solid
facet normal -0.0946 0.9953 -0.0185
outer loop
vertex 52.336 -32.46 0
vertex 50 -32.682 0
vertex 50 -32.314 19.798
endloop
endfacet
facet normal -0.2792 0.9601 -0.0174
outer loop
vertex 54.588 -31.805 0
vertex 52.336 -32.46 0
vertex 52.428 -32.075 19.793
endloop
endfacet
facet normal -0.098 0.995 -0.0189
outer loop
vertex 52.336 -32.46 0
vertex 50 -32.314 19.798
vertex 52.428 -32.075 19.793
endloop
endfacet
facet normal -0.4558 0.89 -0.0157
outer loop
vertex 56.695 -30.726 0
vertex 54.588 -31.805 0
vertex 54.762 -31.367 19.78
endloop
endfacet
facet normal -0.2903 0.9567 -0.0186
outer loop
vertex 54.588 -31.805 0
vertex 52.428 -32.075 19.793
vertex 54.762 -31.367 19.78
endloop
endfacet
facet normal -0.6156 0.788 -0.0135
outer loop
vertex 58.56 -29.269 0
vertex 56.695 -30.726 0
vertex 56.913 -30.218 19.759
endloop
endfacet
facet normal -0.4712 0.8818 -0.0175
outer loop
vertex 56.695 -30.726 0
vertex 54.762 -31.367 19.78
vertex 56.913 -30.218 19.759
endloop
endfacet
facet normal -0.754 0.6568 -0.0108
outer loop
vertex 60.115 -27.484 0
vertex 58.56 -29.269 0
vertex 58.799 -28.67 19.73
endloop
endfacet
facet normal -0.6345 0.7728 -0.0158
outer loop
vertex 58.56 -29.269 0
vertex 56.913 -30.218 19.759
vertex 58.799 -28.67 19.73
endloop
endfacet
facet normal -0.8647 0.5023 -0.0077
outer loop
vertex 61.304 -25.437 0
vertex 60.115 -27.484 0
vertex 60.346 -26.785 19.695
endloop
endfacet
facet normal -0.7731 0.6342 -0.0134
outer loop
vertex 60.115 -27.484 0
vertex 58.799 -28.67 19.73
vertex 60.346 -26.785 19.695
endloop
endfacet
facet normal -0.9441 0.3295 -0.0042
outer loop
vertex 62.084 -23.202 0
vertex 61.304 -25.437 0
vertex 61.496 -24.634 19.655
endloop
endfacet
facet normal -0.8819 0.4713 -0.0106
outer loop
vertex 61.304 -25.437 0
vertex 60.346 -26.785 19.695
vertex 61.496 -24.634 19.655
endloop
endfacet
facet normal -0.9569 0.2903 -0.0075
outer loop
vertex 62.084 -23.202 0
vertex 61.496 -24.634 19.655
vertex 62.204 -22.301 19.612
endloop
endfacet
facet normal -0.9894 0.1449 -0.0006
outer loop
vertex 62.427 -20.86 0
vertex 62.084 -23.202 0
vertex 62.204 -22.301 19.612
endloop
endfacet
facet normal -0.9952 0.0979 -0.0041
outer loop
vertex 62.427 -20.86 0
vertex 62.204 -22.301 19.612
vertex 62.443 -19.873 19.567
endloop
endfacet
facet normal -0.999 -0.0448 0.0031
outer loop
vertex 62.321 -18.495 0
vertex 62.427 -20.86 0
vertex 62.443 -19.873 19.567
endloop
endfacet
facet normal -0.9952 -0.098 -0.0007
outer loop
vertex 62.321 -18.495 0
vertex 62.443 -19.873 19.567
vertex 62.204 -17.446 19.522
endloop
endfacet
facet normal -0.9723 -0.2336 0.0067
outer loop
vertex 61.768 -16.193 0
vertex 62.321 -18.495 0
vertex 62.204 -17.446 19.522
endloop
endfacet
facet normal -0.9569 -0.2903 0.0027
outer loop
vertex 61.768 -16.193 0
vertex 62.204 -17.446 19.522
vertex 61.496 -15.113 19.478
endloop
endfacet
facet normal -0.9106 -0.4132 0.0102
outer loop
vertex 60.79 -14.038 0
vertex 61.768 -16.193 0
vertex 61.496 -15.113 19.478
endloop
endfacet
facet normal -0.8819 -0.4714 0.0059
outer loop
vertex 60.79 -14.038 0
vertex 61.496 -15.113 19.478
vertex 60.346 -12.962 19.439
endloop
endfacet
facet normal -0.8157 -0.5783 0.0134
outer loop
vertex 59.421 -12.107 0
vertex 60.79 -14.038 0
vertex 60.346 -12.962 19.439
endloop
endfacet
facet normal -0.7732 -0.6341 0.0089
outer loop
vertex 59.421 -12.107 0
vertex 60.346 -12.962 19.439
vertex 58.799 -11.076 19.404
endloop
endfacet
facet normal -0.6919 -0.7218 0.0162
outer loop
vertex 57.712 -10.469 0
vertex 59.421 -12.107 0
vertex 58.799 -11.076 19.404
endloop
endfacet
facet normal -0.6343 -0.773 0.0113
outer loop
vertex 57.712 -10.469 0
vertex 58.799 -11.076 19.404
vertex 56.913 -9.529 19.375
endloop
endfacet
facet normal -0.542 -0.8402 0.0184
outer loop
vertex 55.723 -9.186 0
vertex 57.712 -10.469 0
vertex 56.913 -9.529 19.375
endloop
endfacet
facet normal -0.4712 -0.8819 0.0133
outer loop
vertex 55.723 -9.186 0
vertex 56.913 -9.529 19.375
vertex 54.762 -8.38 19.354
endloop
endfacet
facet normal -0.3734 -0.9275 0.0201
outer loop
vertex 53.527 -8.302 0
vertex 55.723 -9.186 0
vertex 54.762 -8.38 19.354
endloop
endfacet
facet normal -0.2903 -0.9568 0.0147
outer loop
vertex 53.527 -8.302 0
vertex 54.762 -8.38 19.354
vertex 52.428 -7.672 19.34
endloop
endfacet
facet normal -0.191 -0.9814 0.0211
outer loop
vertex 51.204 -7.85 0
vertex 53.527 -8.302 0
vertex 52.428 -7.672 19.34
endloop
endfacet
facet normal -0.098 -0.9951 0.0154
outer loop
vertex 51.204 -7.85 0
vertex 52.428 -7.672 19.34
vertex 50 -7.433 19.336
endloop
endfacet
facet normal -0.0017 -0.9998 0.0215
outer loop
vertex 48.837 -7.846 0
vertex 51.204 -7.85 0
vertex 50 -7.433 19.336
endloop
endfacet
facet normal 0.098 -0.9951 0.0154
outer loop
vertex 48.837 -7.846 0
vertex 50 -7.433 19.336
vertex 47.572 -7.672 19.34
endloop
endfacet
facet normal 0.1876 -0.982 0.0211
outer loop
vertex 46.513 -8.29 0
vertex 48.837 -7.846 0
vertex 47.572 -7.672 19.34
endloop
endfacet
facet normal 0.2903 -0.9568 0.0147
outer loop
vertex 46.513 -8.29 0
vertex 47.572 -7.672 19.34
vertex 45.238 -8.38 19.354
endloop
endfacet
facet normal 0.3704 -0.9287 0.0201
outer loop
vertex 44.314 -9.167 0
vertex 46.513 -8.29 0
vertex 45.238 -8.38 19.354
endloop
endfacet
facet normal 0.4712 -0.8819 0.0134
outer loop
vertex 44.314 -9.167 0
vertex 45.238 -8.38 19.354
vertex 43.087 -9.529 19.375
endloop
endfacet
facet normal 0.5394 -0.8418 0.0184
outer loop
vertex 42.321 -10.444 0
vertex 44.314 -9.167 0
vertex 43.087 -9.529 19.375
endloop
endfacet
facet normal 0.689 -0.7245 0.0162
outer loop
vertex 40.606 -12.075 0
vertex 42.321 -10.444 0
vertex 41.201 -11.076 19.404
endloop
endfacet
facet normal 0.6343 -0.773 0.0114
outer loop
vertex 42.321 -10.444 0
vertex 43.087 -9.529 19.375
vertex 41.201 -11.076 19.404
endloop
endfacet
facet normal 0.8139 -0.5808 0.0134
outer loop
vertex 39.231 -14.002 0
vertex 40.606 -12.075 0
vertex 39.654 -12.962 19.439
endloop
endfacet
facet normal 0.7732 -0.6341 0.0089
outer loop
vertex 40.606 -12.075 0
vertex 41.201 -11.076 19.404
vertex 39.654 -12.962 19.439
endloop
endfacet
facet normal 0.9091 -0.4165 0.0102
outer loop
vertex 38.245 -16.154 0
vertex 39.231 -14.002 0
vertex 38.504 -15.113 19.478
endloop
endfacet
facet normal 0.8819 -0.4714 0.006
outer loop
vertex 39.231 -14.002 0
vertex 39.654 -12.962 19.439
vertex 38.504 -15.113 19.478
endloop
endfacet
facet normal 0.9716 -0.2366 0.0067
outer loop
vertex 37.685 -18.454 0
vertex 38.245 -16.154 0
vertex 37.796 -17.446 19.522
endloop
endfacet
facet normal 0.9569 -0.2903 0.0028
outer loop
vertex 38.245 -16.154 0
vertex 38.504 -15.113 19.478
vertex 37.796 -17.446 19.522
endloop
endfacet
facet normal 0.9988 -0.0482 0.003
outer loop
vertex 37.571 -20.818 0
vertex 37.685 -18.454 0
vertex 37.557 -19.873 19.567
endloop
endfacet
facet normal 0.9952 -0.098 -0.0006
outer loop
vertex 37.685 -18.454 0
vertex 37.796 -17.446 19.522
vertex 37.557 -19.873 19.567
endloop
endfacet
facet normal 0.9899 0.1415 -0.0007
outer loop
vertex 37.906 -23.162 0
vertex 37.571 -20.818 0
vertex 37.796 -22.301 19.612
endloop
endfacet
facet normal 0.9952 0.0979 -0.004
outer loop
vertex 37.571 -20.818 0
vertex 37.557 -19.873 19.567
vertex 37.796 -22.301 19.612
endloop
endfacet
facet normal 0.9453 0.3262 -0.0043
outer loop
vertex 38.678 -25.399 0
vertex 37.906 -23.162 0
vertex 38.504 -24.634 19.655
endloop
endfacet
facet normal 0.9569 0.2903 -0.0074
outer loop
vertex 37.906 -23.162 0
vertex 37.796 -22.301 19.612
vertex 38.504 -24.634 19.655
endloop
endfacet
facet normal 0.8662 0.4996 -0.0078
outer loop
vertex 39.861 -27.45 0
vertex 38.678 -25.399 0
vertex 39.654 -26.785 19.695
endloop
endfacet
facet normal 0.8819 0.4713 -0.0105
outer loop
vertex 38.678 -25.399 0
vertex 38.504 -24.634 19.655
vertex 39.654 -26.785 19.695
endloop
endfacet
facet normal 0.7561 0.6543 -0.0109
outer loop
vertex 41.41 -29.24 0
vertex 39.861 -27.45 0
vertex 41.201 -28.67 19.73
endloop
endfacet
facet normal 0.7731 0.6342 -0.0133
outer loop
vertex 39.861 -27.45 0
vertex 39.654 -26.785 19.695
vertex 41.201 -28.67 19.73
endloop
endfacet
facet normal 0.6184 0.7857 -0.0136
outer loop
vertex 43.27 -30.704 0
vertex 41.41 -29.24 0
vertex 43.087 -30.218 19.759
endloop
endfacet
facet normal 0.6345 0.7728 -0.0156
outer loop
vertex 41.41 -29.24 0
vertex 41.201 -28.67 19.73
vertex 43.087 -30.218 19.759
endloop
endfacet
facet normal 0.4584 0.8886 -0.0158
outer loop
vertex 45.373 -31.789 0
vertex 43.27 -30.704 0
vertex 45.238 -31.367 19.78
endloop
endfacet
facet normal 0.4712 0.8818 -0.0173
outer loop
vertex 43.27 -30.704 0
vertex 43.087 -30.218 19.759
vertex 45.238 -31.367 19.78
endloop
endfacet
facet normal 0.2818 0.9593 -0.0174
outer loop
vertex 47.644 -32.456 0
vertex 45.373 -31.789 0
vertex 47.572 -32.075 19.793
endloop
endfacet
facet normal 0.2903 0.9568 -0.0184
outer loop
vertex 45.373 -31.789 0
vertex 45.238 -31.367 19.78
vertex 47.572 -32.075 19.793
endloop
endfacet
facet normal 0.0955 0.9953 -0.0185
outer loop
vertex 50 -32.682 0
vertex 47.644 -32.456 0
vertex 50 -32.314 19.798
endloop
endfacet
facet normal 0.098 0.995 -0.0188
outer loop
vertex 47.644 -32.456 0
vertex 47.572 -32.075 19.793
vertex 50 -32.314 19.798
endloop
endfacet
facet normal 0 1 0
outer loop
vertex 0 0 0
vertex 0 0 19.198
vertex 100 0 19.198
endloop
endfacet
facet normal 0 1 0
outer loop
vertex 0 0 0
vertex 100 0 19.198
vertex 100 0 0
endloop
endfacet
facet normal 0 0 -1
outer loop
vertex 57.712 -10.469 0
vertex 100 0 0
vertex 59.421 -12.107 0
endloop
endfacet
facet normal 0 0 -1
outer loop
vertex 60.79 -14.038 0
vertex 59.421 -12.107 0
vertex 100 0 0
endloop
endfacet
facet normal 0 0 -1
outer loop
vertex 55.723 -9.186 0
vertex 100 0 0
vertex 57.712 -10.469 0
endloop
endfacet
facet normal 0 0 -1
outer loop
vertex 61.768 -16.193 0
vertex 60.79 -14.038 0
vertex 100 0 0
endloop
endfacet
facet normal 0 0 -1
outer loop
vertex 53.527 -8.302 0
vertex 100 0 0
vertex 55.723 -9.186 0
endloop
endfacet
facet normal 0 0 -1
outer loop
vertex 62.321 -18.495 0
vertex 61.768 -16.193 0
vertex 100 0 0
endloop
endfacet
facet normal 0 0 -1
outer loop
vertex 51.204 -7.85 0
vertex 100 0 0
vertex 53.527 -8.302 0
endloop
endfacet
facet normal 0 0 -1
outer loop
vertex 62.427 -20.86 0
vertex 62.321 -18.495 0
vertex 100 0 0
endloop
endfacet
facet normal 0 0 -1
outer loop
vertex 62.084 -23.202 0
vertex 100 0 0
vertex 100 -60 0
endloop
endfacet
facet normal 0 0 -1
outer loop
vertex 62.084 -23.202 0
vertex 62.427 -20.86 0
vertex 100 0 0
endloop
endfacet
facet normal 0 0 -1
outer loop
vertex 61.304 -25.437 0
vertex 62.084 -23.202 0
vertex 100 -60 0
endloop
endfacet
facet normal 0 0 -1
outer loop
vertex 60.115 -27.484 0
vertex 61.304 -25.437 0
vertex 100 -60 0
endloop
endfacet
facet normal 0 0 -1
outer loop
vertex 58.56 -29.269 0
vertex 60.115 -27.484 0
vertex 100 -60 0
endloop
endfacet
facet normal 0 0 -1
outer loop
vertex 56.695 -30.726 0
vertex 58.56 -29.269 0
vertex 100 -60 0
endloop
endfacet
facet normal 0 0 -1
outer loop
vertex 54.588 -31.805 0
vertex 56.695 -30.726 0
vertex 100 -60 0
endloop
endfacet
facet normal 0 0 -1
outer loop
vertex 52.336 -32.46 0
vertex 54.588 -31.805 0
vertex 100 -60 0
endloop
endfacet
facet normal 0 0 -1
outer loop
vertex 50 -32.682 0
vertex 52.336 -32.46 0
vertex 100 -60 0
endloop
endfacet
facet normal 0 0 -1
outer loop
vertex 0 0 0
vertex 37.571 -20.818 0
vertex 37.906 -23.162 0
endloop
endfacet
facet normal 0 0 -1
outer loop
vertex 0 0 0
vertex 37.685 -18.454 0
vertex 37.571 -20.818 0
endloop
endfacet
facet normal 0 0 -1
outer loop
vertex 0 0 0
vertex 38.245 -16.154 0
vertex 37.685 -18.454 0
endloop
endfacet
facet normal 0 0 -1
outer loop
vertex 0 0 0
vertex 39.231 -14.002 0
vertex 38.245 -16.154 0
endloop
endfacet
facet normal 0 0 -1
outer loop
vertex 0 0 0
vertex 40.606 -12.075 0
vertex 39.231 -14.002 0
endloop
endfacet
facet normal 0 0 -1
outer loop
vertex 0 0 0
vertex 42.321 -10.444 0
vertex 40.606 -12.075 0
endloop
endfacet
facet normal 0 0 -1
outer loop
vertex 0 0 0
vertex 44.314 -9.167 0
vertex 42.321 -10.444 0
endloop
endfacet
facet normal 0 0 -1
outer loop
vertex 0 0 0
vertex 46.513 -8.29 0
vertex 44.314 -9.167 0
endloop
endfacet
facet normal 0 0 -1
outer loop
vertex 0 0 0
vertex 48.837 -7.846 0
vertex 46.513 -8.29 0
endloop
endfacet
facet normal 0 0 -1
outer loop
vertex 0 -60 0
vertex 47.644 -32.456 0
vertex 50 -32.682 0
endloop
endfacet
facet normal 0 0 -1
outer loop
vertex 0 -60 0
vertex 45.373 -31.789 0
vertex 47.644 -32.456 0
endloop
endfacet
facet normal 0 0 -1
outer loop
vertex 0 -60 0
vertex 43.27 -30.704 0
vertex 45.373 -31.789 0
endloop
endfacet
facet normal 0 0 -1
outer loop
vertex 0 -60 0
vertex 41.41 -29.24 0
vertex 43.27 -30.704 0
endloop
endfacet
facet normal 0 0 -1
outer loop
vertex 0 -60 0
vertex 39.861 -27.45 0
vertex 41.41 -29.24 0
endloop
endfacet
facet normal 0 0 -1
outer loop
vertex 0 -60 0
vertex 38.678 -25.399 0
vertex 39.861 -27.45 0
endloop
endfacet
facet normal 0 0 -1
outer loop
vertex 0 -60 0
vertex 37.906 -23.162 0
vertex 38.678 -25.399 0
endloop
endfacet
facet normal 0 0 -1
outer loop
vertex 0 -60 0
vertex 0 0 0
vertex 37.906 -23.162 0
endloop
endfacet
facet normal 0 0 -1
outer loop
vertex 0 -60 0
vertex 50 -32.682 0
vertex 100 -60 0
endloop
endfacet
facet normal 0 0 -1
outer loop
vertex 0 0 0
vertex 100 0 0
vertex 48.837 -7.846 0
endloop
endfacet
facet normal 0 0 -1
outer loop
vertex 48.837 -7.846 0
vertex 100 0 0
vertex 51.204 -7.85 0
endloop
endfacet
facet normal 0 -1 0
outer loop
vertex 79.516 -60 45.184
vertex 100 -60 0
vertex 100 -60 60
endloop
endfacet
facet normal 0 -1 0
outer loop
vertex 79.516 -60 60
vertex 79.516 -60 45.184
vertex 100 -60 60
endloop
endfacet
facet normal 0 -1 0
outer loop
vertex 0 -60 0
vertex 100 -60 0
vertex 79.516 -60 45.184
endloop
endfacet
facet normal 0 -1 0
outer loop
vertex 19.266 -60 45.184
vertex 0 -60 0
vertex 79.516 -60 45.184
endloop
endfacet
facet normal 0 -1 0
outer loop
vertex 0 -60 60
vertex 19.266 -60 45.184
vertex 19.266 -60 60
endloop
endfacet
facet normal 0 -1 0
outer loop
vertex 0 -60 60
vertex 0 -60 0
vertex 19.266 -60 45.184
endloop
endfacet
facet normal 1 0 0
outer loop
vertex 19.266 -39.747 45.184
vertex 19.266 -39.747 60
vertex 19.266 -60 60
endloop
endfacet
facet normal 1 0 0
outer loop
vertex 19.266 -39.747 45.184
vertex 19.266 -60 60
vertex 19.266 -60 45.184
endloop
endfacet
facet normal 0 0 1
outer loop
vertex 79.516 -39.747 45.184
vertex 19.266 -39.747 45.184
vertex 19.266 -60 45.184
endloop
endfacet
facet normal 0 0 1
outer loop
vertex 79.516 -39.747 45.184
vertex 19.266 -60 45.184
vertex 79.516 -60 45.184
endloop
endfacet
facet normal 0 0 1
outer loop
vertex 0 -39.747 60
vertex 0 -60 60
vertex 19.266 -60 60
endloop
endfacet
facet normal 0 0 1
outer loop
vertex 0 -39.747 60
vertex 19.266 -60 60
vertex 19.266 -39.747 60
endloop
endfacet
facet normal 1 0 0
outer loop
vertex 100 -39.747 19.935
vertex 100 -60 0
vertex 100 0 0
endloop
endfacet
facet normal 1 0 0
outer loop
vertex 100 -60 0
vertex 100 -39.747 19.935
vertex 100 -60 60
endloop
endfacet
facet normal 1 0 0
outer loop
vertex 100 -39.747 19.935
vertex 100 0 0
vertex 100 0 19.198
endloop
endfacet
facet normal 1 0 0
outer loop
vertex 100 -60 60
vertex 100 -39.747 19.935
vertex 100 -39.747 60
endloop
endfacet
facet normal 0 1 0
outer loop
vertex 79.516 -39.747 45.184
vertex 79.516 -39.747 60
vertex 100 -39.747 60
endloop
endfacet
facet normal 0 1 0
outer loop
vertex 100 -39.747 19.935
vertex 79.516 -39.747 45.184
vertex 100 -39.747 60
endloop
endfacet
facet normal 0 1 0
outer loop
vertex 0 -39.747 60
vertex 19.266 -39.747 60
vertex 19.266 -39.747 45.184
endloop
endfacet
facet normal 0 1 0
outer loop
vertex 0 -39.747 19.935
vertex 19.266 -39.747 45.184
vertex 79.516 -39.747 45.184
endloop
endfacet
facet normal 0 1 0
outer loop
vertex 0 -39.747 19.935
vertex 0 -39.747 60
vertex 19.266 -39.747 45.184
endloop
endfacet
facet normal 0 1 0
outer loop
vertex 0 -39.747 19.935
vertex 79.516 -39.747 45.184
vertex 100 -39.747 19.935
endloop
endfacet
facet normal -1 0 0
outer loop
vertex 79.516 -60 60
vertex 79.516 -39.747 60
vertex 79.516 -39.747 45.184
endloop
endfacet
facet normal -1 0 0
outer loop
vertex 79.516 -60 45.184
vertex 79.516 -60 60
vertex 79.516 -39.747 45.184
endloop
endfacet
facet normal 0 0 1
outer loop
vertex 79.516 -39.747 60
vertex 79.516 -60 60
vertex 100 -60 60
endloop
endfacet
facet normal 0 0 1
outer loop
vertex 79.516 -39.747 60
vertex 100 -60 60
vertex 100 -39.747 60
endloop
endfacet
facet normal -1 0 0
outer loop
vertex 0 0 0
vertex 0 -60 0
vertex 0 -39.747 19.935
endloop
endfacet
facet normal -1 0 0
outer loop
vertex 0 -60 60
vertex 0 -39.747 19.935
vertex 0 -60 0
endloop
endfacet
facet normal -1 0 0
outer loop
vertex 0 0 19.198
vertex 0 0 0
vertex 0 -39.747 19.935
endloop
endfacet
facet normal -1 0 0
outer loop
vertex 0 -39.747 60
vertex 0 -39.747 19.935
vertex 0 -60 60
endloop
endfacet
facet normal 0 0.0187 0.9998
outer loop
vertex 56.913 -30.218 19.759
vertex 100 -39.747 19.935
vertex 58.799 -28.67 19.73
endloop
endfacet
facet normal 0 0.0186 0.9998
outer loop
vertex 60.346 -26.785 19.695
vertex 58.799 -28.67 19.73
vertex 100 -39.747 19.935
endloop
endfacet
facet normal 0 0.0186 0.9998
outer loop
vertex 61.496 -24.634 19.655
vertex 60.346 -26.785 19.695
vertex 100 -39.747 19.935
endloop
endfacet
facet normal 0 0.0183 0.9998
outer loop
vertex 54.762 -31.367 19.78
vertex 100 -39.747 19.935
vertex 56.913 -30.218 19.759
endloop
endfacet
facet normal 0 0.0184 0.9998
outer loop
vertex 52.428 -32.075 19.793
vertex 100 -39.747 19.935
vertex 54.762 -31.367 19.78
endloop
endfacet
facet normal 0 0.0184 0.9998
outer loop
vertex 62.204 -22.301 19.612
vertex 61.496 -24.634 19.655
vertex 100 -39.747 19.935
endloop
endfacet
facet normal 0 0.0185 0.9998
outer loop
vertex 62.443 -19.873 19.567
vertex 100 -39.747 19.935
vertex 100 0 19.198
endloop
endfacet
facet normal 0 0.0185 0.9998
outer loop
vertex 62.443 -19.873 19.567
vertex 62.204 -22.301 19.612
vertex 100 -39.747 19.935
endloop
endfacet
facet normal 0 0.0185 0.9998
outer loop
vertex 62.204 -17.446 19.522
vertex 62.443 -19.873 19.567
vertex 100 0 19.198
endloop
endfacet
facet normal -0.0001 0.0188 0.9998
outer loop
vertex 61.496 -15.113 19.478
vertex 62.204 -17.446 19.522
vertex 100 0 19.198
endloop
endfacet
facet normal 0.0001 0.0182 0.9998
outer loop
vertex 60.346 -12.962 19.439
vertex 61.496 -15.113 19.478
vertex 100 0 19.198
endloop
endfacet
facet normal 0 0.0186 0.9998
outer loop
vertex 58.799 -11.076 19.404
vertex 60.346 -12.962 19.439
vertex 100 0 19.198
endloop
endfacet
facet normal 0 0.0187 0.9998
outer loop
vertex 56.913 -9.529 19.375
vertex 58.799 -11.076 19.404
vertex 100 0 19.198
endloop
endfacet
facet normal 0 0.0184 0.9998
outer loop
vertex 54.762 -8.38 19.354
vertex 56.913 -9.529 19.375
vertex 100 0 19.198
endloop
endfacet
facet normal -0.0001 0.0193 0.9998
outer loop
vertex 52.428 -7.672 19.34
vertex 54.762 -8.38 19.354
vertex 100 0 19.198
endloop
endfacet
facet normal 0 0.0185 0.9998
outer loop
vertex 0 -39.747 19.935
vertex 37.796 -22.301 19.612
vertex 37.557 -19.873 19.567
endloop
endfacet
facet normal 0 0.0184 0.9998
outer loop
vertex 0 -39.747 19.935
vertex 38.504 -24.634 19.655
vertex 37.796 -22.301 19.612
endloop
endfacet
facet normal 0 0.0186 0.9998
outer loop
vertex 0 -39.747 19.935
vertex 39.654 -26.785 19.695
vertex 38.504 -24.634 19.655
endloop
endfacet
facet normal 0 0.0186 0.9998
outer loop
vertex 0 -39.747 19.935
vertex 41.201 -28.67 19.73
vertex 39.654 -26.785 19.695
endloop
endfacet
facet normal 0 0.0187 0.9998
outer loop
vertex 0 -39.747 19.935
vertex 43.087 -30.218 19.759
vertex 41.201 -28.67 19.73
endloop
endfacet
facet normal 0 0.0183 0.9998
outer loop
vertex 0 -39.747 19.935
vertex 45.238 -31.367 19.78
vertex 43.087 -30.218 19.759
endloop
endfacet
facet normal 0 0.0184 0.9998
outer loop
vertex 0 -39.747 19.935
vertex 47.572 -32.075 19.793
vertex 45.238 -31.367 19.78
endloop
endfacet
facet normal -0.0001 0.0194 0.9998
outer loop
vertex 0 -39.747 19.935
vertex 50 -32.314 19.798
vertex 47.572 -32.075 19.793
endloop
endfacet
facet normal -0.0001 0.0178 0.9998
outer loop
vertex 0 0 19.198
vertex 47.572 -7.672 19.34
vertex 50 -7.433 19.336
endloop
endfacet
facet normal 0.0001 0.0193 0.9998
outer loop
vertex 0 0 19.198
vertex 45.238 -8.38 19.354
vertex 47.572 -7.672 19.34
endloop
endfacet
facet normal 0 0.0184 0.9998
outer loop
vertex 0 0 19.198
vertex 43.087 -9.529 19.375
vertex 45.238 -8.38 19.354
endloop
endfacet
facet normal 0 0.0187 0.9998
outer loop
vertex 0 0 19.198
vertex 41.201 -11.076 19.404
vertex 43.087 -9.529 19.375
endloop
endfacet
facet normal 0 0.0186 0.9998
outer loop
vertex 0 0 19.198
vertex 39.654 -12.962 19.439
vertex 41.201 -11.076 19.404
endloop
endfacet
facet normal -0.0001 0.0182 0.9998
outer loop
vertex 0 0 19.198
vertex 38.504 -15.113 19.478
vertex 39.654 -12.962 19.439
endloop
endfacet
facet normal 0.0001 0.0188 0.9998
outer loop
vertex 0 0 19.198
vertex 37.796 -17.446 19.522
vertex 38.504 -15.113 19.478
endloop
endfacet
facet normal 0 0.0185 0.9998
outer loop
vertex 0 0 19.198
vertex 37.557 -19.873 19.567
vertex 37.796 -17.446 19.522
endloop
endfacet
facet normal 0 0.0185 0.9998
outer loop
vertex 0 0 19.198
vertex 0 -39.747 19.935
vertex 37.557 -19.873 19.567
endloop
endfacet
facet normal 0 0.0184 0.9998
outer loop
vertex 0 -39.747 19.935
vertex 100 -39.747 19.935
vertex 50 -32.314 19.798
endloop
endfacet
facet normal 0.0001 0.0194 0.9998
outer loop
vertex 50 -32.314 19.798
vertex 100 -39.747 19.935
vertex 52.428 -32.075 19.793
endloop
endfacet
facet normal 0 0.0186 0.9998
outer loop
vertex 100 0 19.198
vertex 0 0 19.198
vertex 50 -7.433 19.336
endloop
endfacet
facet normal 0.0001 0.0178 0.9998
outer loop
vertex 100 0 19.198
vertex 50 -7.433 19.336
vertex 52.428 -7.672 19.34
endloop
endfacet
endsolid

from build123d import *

# Parameters (mm, degrees)
BOSS_EXTRUDE1_DEPTH = 100
SKETCH5_R           = 12.44300021
SKETCH5_W           = 62.427684028
SKETCH5_H           = 20.04871256
CUT_EXTRUDE1_DEPTH  = 100
SKETCH6_W           = 60.250527476
SKETCH6_H           = 14.81598125
CUT_EXTRUDE2_DEPTH  = 100


with BuildPart() as part:
    # Sketch2 → Boss-Extrude1 (new body)
    with BuildSketch(Plane(origin=(0, 0, 0), x_dir=(0, 0, -1), z_dir=(1, 0, 0))):
        Polygon((0, 0), (0, -60), (-60, -60), (-60, -39.746873043), (-19.935380451, -39.746873043), (-19.198069057, 0), align=None)
    extrude(amount=BOSS_EXTRUDE1_DEPTH)

    # Sketch5 → Cut-Extrude1 (cut)
    with BuildSketch(Plane(origin=(0, 0.356005009, 19.191465102), x_dir=(1, 0, 0), z_dir=(0, 0.018546982770064533, 0.99982798992133))):
        with Locations(Location((50, -20.232921797, 0), (0, 0, 270))):
            Circle(SKETCH5_R)
        with Locations((27.151963887, -76.870783424)):
            Rectangle(SKETCH5_W, SKETCH5_H)
    extrude(amount=-CUT_EXTRUDE1_DEPTH, mode=Mode.SUBTRACT)

    # Sketch6 → Cut-Extrude2 (cut)
    with BuildSketch(Plane(origin=(0, -39.746873043, 0), x_dir=(1, 0, 0), z_dir=(0, 1, 0))):
        with Locations((49.391031419, -52.592009375)):
            Rectangle(SKETCH6_W, SKETCH6_H)
    extrude(amount=-CUT_EXTRUDE2_DEPTH, mode=Mode.SUBTRACT)


solid = part.part
